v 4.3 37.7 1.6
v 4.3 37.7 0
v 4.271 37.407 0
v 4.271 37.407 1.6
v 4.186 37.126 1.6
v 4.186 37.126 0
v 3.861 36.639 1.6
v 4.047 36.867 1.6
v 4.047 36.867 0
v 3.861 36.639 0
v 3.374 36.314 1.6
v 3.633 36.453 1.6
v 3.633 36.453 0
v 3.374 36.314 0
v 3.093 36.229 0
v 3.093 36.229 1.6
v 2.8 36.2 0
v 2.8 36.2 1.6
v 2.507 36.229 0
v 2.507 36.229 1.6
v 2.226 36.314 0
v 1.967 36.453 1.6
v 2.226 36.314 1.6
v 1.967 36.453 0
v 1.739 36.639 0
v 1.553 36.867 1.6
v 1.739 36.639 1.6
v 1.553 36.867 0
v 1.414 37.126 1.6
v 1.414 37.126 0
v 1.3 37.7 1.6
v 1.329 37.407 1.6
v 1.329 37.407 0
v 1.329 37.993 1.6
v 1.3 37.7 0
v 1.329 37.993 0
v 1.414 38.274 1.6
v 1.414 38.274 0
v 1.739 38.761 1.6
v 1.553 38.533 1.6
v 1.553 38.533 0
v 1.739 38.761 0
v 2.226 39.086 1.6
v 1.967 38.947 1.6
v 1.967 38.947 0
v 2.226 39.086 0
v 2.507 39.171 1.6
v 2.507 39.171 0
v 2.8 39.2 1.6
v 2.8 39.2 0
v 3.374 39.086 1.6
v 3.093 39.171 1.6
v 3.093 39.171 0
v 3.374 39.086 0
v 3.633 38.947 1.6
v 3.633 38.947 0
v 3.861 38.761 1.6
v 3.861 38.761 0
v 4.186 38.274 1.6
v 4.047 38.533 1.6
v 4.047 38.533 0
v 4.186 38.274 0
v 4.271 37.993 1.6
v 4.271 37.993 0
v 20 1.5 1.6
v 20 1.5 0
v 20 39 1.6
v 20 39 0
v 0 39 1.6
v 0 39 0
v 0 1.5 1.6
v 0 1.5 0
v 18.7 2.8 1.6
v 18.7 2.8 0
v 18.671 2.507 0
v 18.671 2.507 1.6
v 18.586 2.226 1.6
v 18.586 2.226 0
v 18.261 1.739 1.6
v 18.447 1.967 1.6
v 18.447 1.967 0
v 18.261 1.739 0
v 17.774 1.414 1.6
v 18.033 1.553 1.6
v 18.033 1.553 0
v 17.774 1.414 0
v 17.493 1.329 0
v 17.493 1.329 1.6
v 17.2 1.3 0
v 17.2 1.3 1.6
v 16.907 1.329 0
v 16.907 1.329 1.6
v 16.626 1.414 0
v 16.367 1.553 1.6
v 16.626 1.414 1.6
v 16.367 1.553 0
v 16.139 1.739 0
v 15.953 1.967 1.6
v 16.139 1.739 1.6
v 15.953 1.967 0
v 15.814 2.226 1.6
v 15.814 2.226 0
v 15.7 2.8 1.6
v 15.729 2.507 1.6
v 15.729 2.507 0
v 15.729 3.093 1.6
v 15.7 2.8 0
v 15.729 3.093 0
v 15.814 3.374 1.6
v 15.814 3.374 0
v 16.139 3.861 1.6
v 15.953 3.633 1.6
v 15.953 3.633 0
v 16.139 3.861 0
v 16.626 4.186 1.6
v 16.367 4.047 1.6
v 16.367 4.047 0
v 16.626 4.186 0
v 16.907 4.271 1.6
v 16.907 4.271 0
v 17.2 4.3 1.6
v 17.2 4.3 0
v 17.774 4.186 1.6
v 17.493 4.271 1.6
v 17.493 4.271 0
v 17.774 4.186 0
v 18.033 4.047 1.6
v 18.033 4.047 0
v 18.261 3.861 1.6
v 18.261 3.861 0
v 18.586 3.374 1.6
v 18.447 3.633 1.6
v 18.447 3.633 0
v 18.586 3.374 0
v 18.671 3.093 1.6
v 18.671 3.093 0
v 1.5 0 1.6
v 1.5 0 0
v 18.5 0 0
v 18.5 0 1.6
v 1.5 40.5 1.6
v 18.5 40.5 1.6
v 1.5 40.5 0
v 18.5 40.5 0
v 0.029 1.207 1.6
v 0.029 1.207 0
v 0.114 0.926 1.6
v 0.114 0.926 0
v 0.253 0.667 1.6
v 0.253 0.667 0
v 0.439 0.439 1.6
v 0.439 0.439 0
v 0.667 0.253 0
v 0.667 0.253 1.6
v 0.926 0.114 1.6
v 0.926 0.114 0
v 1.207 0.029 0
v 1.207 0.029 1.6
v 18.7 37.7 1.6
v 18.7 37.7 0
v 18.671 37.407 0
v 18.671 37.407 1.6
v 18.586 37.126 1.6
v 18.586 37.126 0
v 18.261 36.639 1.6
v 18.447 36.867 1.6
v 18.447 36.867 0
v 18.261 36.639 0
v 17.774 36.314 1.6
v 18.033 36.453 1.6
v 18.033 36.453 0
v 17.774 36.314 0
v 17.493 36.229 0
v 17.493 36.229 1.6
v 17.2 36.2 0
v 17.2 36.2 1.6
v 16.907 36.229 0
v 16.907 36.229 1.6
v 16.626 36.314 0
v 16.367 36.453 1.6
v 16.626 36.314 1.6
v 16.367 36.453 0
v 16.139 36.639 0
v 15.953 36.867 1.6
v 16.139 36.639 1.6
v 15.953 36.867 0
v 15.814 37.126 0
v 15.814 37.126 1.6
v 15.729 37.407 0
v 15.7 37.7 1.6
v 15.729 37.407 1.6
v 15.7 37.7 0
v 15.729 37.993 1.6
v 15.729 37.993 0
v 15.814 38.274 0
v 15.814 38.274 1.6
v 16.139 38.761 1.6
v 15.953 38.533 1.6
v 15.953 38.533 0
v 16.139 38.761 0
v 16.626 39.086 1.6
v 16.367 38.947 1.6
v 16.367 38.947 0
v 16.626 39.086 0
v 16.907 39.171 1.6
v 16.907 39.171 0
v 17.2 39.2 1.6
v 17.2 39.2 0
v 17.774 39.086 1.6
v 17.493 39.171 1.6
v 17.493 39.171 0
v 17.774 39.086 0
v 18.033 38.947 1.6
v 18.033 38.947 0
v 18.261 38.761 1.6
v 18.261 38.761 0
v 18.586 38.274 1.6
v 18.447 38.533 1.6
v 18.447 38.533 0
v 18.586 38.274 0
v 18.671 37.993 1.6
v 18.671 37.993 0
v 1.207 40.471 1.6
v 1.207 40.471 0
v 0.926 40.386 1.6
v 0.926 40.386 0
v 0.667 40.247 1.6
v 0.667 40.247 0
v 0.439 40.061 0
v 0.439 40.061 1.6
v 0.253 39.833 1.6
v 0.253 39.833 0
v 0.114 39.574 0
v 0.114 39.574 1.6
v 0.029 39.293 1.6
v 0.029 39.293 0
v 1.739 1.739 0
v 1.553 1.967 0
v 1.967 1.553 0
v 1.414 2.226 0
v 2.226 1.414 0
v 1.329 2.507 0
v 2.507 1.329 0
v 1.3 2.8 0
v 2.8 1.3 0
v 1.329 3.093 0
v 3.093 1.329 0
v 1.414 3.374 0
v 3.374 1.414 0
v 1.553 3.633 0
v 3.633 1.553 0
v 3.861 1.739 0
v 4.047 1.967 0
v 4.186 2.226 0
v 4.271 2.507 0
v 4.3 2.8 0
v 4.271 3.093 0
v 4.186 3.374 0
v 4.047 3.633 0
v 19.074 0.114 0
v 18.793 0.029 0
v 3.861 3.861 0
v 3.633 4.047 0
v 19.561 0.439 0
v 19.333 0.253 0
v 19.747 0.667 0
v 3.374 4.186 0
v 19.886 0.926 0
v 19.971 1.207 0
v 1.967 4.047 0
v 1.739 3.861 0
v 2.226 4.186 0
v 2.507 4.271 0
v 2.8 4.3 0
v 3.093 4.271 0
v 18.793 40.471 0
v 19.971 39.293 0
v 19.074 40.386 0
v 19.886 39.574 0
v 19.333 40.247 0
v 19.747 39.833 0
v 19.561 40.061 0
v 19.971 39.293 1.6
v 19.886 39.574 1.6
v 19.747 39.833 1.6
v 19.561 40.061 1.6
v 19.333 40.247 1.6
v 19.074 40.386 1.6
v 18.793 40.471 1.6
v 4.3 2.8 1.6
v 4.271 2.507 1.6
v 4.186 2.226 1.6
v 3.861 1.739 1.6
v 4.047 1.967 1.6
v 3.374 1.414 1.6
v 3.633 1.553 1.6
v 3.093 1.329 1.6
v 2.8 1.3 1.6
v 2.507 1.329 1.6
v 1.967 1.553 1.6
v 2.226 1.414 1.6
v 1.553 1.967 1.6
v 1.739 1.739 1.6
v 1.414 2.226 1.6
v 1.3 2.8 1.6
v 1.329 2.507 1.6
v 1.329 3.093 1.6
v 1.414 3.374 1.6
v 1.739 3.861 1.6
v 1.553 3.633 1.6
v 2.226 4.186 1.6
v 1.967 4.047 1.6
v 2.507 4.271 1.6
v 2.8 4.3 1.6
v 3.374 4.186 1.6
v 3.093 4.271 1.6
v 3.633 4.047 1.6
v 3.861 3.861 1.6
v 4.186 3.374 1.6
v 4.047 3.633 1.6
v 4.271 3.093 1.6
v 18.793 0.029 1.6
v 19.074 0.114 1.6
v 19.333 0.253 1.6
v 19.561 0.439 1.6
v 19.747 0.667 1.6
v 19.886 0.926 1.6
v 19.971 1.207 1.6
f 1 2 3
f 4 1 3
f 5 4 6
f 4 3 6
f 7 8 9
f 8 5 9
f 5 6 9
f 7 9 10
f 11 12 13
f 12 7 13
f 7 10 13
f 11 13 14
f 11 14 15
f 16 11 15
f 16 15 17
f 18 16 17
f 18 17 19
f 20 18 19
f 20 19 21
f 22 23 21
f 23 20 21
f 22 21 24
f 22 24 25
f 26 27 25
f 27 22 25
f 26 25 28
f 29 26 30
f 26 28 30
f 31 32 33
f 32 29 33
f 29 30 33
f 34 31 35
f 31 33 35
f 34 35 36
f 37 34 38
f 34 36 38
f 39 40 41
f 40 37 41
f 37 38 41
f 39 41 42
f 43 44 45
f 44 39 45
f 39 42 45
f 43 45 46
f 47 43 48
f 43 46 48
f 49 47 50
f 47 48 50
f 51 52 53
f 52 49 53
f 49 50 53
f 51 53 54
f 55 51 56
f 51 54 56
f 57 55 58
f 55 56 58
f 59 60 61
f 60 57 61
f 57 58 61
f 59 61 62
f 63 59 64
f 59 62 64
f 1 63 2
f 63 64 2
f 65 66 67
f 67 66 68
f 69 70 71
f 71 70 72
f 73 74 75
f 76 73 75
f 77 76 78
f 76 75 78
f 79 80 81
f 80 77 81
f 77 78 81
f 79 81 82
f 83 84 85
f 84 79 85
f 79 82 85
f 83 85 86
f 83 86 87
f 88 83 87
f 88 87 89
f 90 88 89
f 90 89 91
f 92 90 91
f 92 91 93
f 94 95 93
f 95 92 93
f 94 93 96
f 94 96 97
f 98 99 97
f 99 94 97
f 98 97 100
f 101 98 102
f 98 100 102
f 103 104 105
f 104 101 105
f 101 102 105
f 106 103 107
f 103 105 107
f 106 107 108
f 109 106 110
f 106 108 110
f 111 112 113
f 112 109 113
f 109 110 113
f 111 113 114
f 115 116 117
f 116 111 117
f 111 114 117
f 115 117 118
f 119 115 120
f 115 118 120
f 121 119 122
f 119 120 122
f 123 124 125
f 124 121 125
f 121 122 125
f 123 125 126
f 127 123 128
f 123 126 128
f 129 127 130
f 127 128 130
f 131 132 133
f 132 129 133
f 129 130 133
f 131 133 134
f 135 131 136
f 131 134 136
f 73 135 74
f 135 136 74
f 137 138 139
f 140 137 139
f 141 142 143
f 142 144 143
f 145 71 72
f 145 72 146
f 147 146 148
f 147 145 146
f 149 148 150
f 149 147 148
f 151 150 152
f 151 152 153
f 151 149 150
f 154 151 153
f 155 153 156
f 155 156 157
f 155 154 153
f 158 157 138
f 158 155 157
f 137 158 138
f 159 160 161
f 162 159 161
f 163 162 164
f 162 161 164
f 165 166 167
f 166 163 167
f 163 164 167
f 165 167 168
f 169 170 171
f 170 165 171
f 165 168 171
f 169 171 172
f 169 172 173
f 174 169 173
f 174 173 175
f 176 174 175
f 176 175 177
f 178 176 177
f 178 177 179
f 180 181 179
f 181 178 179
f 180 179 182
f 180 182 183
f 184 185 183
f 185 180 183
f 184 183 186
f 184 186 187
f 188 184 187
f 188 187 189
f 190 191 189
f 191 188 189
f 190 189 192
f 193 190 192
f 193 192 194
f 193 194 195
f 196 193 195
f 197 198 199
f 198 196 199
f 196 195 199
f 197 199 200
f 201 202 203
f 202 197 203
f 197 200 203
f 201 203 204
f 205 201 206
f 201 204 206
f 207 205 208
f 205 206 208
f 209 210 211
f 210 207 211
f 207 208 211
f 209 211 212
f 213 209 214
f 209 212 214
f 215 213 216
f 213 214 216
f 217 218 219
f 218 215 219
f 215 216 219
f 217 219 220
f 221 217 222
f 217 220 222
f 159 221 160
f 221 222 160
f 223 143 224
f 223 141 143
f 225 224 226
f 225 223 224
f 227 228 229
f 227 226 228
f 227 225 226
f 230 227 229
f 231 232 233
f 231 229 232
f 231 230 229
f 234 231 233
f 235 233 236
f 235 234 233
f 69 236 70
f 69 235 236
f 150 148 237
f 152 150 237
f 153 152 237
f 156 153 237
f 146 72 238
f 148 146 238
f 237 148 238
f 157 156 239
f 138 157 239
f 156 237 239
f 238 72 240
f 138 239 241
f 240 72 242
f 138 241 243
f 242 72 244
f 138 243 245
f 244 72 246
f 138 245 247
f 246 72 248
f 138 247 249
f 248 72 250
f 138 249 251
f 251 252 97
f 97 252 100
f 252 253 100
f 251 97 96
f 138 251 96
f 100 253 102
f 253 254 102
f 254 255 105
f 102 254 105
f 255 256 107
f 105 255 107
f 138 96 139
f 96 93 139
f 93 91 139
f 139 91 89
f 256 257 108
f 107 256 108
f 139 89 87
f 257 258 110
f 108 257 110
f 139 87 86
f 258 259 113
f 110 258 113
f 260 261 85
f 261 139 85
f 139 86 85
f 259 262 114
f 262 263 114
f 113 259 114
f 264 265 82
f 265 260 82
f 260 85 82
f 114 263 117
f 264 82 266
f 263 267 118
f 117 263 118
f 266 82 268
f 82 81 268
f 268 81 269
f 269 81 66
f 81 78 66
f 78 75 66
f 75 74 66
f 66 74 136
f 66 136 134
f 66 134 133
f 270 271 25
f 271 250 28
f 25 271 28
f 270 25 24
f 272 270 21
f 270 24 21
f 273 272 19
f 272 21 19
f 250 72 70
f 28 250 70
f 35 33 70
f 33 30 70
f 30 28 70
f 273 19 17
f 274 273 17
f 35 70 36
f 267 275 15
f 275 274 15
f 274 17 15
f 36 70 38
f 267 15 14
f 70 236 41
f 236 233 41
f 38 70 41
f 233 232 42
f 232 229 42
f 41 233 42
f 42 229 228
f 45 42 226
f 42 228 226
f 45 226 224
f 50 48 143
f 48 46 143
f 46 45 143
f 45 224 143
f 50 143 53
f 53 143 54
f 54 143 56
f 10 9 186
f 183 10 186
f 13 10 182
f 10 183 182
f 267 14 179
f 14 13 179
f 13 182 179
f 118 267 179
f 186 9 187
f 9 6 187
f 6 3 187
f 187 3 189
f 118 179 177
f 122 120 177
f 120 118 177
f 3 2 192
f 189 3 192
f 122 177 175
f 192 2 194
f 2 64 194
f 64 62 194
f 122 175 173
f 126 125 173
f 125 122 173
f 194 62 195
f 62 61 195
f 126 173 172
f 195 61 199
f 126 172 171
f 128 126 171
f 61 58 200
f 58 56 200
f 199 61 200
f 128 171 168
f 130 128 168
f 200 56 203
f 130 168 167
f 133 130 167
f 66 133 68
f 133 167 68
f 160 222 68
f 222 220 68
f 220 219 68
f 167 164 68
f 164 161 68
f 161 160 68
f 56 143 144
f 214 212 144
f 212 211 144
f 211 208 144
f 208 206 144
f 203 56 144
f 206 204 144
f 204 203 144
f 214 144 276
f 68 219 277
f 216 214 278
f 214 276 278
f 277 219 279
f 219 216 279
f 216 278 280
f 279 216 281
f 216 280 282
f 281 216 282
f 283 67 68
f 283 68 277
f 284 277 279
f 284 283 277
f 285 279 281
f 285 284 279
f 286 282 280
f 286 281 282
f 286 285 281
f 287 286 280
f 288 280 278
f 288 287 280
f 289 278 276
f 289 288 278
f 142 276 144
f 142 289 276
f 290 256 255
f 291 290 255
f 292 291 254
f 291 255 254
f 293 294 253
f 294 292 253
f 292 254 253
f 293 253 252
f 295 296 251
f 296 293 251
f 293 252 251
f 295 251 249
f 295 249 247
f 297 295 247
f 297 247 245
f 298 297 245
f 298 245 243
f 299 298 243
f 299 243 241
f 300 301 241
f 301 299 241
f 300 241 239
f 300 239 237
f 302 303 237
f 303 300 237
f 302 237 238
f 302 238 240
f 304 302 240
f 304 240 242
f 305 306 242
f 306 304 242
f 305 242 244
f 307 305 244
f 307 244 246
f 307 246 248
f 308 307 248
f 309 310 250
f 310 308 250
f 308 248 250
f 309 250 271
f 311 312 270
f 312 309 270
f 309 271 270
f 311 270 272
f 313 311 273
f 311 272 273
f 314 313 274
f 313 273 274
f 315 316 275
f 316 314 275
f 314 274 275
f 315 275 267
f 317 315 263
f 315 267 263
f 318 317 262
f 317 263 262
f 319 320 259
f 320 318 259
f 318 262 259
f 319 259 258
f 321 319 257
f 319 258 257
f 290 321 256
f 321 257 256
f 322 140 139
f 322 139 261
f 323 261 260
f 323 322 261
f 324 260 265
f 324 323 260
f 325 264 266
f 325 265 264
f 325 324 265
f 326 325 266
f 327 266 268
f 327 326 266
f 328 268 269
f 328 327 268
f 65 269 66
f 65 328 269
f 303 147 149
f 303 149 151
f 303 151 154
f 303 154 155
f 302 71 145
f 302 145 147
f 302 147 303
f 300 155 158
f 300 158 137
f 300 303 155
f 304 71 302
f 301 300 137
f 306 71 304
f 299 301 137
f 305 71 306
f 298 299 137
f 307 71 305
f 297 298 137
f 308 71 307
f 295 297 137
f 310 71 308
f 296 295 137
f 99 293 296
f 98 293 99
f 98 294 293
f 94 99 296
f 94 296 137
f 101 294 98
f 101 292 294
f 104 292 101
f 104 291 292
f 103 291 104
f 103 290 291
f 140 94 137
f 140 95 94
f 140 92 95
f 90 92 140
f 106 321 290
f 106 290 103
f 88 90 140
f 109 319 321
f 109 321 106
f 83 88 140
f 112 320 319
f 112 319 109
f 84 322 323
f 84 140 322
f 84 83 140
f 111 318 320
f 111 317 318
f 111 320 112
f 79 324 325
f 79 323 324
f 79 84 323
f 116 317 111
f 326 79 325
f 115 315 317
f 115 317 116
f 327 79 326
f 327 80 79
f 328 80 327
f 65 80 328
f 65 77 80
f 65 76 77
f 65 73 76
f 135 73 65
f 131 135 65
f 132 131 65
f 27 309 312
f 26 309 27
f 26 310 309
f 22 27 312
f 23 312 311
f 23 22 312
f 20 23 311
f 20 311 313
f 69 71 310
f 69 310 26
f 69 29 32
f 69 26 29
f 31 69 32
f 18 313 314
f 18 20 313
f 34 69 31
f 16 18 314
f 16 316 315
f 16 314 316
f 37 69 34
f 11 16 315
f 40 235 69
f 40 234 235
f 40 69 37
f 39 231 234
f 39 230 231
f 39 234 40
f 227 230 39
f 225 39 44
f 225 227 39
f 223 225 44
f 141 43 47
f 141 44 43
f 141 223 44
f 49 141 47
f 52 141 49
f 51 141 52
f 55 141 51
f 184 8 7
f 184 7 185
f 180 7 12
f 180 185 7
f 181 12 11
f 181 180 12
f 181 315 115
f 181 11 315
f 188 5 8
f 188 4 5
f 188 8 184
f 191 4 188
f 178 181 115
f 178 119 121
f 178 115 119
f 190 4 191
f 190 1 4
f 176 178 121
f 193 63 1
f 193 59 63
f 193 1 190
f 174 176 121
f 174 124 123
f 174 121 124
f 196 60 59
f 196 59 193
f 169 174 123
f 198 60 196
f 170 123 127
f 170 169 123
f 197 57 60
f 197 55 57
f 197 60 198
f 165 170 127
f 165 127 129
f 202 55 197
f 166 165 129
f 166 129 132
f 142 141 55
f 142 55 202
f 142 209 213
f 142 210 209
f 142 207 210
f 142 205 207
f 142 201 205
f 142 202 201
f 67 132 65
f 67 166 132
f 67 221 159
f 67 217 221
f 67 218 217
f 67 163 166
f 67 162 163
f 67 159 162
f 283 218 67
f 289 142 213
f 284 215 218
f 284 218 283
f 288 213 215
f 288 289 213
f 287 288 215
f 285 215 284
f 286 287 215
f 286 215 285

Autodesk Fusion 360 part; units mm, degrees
sketch "Sketch1" plane through (0, 0, 0) normal (0, 0, 1) x (1, 0, 0)
  line L0 (0, 0) -> (20, 0)
  line L1 (20, 0) -> (20, 40.5)
  line L2 (20, 40.5) -> (0, 40.5)
  line L3 (0, 40.5) -> (0, 0)
  line L4 (10, 40.5) -> (10, 0) construction
  circle A0 centre (2.8, 37.7) radius 1.5
  circle A1 centre (2.8, 2.8) radius 1.5
  circle A2 centre (17.2, 37.7) radius 1.5
  circle A3 centre (17.2, 2.8) radius 1.5
  dimension "d1" = 20
  dimension "d2" = 40.5
  dimension "d3" = 3
  dimension "d4" = 3
  dimension "d5" = 2.8
  dimension "d6" = 2.8
  dimension "d7" = 2.8
  dimension "d8" = 2.8
extrude "Extrude1" add sketch "Sketch1" along normal blind 1.6
fillet "Fillet1" radius 1.5 4 edges at (20, 0, 0.8) (20, 40.5, 0.8) (0, 40.5, 0.8) (0, 0, 0.8)
